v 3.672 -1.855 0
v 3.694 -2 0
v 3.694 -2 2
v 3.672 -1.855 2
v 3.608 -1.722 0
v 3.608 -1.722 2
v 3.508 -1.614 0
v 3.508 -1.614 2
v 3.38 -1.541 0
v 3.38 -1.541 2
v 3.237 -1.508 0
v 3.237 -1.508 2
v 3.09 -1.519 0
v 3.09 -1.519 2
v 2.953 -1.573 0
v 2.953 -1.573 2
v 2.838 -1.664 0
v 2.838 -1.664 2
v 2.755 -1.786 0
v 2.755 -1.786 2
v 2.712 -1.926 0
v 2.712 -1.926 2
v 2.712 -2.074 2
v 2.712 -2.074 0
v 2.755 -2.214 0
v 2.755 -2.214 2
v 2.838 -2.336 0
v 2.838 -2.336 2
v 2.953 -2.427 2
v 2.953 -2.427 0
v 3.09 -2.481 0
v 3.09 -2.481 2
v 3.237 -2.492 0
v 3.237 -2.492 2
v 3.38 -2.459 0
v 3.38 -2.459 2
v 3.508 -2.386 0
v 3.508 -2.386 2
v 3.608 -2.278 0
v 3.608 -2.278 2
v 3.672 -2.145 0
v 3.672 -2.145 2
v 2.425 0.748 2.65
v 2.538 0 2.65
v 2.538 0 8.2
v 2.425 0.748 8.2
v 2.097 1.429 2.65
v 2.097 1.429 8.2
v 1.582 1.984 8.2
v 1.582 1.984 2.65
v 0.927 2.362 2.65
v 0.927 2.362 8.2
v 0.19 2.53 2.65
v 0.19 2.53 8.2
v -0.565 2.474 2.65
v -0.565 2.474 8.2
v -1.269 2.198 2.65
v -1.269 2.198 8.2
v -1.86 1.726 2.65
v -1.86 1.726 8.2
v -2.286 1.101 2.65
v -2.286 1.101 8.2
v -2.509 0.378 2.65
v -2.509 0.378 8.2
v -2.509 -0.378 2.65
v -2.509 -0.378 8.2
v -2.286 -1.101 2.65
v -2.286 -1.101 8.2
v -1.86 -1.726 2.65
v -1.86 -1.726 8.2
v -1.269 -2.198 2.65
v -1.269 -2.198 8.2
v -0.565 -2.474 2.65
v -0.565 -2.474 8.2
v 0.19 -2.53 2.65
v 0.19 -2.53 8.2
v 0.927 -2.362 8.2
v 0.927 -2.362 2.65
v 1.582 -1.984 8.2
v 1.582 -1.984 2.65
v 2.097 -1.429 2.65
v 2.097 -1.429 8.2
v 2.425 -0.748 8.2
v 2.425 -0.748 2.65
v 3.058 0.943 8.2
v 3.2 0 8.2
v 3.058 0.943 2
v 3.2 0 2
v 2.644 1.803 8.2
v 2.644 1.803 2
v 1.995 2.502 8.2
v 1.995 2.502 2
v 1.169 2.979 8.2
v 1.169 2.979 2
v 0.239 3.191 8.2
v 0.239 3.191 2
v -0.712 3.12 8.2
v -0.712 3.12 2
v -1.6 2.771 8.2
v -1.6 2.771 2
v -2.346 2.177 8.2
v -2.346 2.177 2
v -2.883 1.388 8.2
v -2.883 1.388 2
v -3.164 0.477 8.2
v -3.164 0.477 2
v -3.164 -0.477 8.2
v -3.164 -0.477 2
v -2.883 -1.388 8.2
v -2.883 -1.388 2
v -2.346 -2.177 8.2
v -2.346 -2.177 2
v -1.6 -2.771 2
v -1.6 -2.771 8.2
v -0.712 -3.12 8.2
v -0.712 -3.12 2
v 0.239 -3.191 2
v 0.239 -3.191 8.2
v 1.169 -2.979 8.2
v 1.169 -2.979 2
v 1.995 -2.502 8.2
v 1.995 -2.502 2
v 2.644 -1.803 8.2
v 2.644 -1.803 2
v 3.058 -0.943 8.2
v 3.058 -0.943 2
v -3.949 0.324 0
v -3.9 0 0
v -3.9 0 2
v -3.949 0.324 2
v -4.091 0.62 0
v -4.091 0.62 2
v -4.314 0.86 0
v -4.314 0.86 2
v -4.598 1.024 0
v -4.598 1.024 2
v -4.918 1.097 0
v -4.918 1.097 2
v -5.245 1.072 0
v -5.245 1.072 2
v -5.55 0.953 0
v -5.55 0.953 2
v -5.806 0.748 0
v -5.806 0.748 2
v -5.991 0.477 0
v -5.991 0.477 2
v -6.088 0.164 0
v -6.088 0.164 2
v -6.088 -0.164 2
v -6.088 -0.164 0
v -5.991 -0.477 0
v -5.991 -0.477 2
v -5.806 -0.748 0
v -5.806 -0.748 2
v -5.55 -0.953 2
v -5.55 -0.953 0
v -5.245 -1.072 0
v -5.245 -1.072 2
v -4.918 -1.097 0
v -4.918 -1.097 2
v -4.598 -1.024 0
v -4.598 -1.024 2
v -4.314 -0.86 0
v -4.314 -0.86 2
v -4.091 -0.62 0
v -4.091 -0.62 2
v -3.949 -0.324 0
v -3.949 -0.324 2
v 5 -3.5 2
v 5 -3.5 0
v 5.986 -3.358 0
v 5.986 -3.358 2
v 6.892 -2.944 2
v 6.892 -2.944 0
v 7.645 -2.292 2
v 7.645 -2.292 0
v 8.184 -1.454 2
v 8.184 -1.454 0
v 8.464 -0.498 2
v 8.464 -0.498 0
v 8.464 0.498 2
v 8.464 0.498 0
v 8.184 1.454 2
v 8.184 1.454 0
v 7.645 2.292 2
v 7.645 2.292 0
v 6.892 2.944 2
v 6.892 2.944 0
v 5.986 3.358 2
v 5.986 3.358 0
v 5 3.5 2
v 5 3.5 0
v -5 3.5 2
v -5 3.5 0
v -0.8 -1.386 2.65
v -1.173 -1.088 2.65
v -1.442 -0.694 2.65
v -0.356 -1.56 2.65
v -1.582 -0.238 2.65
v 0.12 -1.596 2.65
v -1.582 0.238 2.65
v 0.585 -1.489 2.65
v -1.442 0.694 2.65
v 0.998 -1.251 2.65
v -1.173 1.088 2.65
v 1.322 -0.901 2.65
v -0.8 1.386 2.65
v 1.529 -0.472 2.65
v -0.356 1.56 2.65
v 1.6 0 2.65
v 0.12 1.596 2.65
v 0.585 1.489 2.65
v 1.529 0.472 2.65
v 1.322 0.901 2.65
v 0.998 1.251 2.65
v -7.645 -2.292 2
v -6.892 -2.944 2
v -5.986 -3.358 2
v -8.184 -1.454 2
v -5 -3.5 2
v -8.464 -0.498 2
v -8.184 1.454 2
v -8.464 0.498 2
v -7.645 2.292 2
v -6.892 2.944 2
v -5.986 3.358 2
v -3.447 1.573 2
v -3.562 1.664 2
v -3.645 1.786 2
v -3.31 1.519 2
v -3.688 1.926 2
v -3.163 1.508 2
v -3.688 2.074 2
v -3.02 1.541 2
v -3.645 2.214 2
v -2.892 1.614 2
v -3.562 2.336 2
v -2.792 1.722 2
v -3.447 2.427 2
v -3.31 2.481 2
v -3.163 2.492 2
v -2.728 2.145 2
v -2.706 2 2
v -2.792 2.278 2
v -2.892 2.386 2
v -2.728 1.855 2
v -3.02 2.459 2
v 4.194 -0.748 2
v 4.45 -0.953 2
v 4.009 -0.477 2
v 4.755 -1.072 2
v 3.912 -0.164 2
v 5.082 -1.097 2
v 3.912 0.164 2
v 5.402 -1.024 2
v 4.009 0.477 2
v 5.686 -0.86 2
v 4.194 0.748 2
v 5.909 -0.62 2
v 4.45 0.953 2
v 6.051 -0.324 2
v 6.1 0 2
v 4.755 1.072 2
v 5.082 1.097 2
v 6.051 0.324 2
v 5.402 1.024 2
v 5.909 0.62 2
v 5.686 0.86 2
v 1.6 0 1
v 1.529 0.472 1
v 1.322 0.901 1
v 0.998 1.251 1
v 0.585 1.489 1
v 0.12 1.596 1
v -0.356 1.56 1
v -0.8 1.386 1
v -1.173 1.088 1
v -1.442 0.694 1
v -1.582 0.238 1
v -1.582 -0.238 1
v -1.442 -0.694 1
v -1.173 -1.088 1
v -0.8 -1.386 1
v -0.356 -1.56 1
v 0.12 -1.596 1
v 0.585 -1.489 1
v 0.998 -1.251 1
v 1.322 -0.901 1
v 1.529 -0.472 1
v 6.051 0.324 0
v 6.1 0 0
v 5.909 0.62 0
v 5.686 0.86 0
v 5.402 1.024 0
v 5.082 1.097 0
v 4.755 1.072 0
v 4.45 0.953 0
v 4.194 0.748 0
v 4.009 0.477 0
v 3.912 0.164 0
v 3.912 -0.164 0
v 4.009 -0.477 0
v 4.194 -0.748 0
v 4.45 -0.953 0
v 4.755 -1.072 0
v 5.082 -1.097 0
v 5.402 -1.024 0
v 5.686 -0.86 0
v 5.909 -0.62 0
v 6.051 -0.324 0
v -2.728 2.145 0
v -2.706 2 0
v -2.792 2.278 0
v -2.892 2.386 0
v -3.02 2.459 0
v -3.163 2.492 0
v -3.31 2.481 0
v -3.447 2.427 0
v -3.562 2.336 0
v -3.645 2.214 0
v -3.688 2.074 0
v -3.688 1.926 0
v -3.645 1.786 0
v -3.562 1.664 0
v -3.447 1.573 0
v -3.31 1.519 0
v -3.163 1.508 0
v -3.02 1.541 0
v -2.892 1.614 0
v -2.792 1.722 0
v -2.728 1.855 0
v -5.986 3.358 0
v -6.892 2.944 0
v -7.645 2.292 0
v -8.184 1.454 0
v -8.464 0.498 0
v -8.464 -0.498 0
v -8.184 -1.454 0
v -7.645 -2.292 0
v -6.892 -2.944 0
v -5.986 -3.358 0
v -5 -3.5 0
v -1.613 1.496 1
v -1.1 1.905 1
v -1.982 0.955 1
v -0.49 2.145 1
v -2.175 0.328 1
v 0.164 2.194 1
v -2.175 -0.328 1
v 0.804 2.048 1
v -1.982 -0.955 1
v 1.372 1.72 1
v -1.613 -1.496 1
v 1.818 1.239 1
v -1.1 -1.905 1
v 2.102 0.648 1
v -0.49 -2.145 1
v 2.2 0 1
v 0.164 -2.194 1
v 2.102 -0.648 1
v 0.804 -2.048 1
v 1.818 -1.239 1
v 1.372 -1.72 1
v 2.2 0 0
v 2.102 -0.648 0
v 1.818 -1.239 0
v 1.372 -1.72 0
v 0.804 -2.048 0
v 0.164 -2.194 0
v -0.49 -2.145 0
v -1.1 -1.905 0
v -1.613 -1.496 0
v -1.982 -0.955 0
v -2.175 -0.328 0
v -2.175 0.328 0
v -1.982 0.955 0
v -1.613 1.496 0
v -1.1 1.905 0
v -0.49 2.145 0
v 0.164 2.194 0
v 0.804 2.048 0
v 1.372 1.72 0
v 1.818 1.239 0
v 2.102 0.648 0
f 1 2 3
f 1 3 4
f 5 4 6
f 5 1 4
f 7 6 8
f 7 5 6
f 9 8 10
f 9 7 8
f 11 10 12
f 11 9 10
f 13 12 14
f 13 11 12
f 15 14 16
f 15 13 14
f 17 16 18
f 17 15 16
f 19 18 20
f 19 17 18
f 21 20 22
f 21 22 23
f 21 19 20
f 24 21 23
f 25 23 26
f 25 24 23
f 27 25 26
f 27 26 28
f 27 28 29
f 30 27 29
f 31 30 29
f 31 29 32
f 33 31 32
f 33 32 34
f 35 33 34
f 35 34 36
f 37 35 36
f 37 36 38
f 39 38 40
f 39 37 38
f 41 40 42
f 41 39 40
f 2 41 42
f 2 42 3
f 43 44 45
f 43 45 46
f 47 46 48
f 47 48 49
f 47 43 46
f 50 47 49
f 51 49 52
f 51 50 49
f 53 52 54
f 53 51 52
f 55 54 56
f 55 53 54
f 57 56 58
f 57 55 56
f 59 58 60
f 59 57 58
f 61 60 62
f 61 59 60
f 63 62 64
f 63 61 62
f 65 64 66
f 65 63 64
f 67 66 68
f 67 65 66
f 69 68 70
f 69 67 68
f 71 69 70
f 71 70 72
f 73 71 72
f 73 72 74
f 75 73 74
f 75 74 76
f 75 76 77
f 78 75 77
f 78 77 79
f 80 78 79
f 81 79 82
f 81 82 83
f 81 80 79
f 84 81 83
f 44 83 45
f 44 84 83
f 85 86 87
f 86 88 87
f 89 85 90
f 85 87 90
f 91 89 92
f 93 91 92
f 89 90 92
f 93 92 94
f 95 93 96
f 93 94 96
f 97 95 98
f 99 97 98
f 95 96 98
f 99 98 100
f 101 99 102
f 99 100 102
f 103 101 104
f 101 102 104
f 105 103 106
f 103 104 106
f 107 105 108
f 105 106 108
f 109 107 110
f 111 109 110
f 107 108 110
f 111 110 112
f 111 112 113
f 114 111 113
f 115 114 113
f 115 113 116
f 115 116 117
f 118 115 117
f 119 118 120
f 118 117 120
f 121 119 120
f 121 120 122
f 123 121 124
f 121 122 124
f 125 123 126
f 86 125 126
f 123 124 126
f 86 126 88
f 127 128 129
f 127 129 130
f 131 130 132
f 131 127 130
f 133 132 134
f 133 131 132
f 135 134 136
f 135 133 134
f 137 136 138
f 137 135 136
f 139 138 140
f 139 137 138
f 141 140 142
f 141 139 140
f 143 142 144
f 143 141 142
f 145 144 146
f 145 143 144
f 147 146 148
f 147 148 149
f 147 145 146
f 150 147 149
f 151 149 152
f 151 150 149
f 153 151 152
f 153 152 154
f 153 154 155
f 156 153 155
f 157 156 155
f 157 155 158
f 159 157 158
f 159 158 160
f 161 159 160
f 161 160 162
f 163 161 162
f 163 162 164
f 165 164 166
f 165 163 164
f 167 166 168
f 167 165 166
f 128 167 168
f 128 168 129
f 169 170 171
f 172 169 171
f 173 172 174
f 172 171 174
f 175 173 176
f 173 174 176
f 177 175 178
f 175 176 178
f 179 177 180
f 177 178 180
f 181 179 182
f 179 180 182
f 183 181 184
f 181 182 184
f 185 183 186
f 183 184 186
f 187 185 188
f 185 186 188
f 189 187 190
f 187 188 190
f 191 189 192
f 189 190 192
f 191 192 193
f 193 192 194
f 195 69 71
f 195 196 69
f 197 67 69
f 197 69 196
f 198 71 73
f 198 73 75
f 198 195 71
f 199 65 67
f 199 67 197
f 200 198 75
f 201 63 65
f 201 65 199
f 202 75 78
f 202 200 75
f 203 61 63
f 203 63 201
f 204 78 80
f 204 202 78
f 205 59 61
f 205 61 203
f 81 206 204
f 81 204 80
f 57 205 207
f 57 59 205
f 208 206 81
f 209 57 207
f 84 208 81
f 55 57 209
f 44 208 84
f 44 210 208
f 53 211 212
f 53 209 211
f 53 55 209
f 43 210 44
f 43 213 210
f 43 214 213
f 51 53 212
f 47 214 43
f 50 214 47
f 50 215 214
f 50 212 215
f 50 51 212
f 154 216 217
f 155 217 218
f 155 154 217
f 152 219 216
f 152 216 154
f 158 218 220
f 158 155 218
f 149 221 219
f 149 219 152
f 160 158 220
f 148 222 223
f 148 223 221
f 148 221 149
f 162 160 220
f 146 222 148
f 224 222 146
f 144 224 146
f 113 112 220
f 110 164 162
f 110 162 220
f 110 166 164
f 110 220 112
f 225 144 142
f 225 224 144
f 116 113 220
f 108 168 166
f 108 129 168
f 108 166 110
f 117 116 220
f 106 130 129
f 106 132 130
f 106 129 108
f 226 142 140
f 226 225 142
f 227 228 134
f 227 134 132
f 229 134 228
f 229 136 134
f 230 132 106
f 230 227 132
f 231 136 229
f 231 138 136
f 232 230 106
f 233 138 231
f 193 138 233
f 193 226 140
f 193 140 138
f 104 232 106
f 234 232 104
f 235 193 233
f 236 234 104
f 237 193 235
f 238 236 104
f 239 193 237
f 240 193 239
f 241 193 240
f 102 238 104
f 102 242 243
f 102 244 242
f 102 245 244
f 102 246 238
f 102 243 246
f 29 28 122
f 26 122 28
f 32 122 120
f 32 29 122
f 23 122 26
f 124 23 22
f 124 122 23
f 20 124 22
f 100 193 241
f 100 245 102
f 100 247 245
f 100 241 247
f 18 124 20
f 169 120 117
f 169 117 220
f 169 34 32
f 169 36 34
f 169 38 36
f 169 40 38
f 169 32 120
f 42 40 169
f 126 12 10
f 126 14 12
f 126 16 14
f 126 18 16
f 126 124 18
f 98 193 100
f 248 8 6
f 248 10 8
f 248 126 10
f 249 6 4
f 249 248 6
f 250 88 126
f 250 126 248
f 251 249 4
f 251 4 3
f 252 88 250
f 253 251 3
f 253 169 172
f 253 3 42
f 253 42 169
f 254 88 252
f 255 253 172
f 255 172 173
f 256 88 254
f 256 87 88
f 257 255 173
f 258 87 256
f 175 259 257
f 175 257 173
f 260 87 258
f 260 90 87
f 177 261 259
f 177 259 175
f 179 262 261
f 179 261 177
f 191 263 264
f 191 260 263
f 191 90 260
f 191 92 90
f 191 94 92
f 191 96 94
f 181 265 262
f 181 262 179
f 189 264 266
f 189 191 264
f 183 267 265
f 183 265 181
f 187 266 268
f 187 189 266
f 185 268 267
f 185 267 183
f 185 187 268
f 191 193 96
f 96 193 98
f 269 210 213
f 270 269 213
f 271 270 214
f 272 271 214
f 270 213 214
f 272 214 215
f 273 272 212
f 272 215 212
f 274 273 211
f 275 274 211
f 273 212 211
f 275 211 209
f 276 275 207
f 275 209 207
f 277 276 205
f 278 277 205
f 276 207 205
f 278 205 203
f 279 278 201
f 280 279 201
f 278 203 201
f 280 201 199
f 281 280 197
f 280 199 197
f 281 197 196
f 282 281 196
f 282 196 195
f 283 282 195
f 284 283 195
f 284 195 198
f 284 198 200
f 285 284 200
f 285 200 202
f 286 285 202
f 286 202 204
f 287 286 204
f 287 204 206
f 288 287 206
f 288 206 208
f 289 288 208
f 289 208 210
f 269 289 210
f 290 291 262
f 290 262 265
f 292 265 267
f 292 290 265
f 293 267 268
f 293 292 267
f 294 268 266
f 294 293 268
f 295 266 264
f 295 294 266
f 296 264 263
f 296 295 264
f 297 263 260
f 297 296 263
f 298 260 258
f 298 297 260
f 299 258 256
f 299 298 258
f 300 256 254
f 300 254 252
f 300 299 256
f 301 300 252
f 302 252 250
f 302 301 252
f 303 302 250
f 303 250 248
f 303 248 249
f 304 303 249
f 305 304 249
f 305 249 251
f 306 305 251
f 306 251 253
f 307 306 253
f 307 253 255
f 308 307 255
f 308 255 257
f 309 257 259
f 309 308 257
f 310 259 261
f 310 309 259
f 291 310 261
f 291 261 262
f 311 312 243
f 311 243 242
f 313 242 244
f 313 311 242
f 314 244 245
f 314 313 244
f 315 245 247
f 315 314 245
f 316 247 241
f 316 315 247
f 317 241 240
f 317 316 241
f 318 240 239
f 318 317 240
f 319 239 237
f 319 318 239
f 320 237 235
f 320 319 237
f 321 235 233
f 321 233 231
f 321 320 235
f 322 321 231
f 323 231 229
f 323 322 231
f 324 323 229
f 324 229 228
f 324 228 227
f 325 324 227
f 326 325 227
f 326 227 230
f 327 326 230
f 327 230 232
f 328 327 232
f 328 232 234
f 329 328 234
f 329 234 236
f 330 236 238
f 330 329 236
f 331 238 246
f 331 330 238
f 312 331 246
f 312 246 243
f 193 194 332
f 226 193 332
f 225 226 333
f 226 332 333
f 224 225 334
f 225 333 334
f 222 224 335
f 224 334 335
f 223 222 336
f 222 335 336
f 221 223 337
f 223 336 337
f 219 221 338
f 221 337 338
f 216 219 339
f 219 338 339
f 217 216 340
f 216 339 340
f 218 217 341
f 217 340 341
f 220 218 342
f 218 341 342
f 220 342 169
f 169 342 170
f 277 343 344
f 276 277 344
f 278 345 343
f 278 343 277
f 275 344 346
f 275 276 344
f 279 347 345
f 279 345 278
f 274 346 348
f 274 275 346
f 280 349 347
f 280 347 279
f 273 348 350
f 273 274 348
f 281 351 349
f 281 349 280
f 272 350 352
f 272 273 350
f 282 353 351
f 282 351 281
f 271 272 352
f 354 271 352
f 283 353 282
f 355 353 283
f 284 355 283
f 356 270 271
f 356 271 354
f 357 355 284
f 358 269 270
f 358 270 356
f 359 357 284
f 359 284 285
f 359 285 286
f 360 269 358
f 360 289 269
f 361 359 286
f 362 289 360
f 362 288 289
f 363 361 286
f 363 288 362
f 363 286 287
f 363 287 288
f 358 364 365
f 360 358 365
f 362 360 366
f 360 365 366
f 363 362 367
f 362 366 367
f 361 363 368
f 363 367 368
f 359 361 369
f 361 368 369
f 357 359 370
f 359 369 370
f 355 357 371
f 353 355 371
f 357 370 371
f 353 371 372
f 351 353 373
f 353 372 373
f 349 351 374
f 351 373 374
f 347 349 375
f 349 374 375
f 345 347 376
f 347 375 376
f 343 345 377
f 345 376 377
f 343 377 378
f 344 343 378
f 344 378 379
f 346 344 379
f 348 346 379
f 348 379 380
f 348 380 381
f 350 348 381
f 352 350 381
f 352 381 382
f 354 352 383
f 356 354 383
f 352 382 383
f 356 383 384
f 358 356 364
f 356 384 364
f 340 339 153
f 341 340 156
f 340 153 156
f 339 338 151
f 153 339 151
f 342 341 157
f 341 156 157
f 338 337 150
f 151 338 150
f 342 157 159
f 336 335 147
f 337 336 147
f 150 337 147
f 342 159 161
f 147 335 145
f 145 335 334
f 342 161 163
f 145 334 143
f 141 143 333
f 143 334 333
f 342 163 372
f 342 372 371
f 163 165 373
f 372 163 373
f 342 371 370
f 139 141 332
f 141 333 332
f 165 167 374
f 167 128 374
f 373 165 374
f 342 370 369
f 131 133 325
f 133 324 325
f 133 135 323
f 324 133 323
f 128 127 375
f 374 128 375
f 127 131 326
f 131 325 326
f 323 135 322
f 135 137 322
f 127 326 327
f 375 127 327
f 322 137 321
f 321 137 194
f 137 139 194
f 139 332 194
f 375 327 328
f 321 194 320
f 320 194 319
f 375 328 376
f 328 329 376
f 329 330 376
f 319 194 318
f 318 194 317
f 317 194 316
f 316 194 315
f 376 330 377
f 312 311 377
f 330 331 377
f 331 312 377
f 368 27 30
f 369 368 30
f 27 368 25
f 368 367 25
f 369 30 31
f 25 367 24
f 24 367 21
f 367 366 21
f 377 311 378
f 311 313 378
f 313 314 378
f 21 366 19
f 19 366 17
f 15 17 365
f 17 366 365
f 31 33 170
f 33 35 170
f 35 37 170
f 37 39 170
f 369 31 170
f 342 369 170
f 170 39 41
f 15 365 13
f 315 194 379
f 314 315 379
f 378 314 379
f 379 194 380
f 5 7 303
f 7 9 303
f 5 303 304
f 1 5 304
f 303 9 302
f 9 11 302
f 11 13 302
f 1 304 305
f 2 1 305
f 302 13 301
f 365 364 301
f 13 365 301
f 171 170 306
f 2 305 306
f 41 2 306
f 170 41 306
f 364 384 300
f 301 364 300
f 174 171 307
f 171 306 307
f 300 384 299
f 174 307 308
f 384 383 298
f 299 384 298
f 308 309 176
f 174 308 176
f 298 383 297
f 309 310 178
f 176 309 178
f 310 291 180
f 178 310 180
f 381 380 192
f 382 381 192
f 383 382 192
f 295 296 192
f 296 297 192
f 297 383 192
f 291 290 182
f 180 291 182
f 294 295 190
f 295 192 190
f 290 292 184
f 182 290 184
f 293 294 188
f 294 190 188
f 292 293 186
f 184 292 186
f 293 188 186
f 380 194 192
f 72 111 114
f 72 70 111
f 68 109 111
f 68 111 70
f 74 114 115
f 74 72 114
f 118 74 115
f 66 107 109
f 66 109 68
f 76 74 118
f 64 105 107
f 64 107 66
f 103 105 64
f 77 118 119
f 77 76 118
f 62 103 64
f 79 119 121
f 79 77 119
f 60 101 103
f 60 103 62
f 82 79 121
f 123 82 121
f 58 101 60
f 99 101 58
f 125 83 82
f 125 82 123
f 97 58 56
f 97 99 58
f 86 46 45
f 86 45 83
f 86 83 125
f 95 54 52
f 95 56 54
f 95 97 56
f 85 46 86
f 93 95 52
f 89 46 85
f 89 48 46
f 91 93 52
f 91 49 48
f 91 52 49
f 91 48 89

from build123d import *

# Parameters (mm, degrees)
F0_R     = 0.4935
F0_R_2   = 1.1
F1_DEPTH = 2
F2_R     = 3.2
F3_DEPTH = 0.65
F4_R     = 3.2
F4_R_2   = 2.5375
F5_DEPTH = 5.55
F6_R     = 1.6
F7_DEPTH = 25
F8_R     = 2.2
F9_DEPTH = 1


with BuildPart() as f1:
    # F0 (on Top) → F1 (new body)
    with BuildSketch(Plane.XY):
        with BuildLine():
            Line((5, 3.5), (-5, 3.5))
            ThreePointArc((-5, 3.5), (-8.5, 0), (-5, -3.5))
            Line((-5, -3.5), (5, -3.5))
            ThreePointArc((5, -3.5), (8.5, 0), (5, 3.5))
        make_face()
        with Locations((3.2, -2)):
            Circle(F0_R, mode=Mode.SUBTRACT)
        with Locations((-5, 0)):
            Circle(F0_R_2, mode=Mode.SUBTRACT)
        with Locations((-3.2, 2)):
            Circle(F0_R, mode=Mode.SUBTRACT)
        with Locations((5, 0)):
            Circle(F0_R_2, mode=Mode.SUBTRACT)
    extrude(amount=F1_DEPTH)

    # F2 (on face) → F3 (join)
    with BuildSketch(Plane.XY.offset(2)):
        Circle(F2_R)
    extrude(amount=F3_DEPTH)

    # F4 (on face) → F5 (join)
    with BuildSketch(Plane.XY.offset(2.65)):
        Circle(F4_R)
        Circle(F4_R_2, mode=Mode.SUBTRACT)
    extrude(amount=F5_DEPTH)

    # F6 (on face) → F7 (cut)
    with BuildSketch(Plane.XY.offset(2.65)):
        Circle(F6_R)
    extrude(amount=-F7_DEPTH, mode=Mode.SUBTRACT)

    # F8 (on face) → F9 (cut)
    with BuildSketch(Plane(origin=(0, 0, 0), x_dir=(1, 0, 0), z_dir=(0, 0, -1))):
        Circle(F8_R)
    extrude(amount=-F9_DEPTH, mode=Mode.SUBTRACT)


solid = f1.part
